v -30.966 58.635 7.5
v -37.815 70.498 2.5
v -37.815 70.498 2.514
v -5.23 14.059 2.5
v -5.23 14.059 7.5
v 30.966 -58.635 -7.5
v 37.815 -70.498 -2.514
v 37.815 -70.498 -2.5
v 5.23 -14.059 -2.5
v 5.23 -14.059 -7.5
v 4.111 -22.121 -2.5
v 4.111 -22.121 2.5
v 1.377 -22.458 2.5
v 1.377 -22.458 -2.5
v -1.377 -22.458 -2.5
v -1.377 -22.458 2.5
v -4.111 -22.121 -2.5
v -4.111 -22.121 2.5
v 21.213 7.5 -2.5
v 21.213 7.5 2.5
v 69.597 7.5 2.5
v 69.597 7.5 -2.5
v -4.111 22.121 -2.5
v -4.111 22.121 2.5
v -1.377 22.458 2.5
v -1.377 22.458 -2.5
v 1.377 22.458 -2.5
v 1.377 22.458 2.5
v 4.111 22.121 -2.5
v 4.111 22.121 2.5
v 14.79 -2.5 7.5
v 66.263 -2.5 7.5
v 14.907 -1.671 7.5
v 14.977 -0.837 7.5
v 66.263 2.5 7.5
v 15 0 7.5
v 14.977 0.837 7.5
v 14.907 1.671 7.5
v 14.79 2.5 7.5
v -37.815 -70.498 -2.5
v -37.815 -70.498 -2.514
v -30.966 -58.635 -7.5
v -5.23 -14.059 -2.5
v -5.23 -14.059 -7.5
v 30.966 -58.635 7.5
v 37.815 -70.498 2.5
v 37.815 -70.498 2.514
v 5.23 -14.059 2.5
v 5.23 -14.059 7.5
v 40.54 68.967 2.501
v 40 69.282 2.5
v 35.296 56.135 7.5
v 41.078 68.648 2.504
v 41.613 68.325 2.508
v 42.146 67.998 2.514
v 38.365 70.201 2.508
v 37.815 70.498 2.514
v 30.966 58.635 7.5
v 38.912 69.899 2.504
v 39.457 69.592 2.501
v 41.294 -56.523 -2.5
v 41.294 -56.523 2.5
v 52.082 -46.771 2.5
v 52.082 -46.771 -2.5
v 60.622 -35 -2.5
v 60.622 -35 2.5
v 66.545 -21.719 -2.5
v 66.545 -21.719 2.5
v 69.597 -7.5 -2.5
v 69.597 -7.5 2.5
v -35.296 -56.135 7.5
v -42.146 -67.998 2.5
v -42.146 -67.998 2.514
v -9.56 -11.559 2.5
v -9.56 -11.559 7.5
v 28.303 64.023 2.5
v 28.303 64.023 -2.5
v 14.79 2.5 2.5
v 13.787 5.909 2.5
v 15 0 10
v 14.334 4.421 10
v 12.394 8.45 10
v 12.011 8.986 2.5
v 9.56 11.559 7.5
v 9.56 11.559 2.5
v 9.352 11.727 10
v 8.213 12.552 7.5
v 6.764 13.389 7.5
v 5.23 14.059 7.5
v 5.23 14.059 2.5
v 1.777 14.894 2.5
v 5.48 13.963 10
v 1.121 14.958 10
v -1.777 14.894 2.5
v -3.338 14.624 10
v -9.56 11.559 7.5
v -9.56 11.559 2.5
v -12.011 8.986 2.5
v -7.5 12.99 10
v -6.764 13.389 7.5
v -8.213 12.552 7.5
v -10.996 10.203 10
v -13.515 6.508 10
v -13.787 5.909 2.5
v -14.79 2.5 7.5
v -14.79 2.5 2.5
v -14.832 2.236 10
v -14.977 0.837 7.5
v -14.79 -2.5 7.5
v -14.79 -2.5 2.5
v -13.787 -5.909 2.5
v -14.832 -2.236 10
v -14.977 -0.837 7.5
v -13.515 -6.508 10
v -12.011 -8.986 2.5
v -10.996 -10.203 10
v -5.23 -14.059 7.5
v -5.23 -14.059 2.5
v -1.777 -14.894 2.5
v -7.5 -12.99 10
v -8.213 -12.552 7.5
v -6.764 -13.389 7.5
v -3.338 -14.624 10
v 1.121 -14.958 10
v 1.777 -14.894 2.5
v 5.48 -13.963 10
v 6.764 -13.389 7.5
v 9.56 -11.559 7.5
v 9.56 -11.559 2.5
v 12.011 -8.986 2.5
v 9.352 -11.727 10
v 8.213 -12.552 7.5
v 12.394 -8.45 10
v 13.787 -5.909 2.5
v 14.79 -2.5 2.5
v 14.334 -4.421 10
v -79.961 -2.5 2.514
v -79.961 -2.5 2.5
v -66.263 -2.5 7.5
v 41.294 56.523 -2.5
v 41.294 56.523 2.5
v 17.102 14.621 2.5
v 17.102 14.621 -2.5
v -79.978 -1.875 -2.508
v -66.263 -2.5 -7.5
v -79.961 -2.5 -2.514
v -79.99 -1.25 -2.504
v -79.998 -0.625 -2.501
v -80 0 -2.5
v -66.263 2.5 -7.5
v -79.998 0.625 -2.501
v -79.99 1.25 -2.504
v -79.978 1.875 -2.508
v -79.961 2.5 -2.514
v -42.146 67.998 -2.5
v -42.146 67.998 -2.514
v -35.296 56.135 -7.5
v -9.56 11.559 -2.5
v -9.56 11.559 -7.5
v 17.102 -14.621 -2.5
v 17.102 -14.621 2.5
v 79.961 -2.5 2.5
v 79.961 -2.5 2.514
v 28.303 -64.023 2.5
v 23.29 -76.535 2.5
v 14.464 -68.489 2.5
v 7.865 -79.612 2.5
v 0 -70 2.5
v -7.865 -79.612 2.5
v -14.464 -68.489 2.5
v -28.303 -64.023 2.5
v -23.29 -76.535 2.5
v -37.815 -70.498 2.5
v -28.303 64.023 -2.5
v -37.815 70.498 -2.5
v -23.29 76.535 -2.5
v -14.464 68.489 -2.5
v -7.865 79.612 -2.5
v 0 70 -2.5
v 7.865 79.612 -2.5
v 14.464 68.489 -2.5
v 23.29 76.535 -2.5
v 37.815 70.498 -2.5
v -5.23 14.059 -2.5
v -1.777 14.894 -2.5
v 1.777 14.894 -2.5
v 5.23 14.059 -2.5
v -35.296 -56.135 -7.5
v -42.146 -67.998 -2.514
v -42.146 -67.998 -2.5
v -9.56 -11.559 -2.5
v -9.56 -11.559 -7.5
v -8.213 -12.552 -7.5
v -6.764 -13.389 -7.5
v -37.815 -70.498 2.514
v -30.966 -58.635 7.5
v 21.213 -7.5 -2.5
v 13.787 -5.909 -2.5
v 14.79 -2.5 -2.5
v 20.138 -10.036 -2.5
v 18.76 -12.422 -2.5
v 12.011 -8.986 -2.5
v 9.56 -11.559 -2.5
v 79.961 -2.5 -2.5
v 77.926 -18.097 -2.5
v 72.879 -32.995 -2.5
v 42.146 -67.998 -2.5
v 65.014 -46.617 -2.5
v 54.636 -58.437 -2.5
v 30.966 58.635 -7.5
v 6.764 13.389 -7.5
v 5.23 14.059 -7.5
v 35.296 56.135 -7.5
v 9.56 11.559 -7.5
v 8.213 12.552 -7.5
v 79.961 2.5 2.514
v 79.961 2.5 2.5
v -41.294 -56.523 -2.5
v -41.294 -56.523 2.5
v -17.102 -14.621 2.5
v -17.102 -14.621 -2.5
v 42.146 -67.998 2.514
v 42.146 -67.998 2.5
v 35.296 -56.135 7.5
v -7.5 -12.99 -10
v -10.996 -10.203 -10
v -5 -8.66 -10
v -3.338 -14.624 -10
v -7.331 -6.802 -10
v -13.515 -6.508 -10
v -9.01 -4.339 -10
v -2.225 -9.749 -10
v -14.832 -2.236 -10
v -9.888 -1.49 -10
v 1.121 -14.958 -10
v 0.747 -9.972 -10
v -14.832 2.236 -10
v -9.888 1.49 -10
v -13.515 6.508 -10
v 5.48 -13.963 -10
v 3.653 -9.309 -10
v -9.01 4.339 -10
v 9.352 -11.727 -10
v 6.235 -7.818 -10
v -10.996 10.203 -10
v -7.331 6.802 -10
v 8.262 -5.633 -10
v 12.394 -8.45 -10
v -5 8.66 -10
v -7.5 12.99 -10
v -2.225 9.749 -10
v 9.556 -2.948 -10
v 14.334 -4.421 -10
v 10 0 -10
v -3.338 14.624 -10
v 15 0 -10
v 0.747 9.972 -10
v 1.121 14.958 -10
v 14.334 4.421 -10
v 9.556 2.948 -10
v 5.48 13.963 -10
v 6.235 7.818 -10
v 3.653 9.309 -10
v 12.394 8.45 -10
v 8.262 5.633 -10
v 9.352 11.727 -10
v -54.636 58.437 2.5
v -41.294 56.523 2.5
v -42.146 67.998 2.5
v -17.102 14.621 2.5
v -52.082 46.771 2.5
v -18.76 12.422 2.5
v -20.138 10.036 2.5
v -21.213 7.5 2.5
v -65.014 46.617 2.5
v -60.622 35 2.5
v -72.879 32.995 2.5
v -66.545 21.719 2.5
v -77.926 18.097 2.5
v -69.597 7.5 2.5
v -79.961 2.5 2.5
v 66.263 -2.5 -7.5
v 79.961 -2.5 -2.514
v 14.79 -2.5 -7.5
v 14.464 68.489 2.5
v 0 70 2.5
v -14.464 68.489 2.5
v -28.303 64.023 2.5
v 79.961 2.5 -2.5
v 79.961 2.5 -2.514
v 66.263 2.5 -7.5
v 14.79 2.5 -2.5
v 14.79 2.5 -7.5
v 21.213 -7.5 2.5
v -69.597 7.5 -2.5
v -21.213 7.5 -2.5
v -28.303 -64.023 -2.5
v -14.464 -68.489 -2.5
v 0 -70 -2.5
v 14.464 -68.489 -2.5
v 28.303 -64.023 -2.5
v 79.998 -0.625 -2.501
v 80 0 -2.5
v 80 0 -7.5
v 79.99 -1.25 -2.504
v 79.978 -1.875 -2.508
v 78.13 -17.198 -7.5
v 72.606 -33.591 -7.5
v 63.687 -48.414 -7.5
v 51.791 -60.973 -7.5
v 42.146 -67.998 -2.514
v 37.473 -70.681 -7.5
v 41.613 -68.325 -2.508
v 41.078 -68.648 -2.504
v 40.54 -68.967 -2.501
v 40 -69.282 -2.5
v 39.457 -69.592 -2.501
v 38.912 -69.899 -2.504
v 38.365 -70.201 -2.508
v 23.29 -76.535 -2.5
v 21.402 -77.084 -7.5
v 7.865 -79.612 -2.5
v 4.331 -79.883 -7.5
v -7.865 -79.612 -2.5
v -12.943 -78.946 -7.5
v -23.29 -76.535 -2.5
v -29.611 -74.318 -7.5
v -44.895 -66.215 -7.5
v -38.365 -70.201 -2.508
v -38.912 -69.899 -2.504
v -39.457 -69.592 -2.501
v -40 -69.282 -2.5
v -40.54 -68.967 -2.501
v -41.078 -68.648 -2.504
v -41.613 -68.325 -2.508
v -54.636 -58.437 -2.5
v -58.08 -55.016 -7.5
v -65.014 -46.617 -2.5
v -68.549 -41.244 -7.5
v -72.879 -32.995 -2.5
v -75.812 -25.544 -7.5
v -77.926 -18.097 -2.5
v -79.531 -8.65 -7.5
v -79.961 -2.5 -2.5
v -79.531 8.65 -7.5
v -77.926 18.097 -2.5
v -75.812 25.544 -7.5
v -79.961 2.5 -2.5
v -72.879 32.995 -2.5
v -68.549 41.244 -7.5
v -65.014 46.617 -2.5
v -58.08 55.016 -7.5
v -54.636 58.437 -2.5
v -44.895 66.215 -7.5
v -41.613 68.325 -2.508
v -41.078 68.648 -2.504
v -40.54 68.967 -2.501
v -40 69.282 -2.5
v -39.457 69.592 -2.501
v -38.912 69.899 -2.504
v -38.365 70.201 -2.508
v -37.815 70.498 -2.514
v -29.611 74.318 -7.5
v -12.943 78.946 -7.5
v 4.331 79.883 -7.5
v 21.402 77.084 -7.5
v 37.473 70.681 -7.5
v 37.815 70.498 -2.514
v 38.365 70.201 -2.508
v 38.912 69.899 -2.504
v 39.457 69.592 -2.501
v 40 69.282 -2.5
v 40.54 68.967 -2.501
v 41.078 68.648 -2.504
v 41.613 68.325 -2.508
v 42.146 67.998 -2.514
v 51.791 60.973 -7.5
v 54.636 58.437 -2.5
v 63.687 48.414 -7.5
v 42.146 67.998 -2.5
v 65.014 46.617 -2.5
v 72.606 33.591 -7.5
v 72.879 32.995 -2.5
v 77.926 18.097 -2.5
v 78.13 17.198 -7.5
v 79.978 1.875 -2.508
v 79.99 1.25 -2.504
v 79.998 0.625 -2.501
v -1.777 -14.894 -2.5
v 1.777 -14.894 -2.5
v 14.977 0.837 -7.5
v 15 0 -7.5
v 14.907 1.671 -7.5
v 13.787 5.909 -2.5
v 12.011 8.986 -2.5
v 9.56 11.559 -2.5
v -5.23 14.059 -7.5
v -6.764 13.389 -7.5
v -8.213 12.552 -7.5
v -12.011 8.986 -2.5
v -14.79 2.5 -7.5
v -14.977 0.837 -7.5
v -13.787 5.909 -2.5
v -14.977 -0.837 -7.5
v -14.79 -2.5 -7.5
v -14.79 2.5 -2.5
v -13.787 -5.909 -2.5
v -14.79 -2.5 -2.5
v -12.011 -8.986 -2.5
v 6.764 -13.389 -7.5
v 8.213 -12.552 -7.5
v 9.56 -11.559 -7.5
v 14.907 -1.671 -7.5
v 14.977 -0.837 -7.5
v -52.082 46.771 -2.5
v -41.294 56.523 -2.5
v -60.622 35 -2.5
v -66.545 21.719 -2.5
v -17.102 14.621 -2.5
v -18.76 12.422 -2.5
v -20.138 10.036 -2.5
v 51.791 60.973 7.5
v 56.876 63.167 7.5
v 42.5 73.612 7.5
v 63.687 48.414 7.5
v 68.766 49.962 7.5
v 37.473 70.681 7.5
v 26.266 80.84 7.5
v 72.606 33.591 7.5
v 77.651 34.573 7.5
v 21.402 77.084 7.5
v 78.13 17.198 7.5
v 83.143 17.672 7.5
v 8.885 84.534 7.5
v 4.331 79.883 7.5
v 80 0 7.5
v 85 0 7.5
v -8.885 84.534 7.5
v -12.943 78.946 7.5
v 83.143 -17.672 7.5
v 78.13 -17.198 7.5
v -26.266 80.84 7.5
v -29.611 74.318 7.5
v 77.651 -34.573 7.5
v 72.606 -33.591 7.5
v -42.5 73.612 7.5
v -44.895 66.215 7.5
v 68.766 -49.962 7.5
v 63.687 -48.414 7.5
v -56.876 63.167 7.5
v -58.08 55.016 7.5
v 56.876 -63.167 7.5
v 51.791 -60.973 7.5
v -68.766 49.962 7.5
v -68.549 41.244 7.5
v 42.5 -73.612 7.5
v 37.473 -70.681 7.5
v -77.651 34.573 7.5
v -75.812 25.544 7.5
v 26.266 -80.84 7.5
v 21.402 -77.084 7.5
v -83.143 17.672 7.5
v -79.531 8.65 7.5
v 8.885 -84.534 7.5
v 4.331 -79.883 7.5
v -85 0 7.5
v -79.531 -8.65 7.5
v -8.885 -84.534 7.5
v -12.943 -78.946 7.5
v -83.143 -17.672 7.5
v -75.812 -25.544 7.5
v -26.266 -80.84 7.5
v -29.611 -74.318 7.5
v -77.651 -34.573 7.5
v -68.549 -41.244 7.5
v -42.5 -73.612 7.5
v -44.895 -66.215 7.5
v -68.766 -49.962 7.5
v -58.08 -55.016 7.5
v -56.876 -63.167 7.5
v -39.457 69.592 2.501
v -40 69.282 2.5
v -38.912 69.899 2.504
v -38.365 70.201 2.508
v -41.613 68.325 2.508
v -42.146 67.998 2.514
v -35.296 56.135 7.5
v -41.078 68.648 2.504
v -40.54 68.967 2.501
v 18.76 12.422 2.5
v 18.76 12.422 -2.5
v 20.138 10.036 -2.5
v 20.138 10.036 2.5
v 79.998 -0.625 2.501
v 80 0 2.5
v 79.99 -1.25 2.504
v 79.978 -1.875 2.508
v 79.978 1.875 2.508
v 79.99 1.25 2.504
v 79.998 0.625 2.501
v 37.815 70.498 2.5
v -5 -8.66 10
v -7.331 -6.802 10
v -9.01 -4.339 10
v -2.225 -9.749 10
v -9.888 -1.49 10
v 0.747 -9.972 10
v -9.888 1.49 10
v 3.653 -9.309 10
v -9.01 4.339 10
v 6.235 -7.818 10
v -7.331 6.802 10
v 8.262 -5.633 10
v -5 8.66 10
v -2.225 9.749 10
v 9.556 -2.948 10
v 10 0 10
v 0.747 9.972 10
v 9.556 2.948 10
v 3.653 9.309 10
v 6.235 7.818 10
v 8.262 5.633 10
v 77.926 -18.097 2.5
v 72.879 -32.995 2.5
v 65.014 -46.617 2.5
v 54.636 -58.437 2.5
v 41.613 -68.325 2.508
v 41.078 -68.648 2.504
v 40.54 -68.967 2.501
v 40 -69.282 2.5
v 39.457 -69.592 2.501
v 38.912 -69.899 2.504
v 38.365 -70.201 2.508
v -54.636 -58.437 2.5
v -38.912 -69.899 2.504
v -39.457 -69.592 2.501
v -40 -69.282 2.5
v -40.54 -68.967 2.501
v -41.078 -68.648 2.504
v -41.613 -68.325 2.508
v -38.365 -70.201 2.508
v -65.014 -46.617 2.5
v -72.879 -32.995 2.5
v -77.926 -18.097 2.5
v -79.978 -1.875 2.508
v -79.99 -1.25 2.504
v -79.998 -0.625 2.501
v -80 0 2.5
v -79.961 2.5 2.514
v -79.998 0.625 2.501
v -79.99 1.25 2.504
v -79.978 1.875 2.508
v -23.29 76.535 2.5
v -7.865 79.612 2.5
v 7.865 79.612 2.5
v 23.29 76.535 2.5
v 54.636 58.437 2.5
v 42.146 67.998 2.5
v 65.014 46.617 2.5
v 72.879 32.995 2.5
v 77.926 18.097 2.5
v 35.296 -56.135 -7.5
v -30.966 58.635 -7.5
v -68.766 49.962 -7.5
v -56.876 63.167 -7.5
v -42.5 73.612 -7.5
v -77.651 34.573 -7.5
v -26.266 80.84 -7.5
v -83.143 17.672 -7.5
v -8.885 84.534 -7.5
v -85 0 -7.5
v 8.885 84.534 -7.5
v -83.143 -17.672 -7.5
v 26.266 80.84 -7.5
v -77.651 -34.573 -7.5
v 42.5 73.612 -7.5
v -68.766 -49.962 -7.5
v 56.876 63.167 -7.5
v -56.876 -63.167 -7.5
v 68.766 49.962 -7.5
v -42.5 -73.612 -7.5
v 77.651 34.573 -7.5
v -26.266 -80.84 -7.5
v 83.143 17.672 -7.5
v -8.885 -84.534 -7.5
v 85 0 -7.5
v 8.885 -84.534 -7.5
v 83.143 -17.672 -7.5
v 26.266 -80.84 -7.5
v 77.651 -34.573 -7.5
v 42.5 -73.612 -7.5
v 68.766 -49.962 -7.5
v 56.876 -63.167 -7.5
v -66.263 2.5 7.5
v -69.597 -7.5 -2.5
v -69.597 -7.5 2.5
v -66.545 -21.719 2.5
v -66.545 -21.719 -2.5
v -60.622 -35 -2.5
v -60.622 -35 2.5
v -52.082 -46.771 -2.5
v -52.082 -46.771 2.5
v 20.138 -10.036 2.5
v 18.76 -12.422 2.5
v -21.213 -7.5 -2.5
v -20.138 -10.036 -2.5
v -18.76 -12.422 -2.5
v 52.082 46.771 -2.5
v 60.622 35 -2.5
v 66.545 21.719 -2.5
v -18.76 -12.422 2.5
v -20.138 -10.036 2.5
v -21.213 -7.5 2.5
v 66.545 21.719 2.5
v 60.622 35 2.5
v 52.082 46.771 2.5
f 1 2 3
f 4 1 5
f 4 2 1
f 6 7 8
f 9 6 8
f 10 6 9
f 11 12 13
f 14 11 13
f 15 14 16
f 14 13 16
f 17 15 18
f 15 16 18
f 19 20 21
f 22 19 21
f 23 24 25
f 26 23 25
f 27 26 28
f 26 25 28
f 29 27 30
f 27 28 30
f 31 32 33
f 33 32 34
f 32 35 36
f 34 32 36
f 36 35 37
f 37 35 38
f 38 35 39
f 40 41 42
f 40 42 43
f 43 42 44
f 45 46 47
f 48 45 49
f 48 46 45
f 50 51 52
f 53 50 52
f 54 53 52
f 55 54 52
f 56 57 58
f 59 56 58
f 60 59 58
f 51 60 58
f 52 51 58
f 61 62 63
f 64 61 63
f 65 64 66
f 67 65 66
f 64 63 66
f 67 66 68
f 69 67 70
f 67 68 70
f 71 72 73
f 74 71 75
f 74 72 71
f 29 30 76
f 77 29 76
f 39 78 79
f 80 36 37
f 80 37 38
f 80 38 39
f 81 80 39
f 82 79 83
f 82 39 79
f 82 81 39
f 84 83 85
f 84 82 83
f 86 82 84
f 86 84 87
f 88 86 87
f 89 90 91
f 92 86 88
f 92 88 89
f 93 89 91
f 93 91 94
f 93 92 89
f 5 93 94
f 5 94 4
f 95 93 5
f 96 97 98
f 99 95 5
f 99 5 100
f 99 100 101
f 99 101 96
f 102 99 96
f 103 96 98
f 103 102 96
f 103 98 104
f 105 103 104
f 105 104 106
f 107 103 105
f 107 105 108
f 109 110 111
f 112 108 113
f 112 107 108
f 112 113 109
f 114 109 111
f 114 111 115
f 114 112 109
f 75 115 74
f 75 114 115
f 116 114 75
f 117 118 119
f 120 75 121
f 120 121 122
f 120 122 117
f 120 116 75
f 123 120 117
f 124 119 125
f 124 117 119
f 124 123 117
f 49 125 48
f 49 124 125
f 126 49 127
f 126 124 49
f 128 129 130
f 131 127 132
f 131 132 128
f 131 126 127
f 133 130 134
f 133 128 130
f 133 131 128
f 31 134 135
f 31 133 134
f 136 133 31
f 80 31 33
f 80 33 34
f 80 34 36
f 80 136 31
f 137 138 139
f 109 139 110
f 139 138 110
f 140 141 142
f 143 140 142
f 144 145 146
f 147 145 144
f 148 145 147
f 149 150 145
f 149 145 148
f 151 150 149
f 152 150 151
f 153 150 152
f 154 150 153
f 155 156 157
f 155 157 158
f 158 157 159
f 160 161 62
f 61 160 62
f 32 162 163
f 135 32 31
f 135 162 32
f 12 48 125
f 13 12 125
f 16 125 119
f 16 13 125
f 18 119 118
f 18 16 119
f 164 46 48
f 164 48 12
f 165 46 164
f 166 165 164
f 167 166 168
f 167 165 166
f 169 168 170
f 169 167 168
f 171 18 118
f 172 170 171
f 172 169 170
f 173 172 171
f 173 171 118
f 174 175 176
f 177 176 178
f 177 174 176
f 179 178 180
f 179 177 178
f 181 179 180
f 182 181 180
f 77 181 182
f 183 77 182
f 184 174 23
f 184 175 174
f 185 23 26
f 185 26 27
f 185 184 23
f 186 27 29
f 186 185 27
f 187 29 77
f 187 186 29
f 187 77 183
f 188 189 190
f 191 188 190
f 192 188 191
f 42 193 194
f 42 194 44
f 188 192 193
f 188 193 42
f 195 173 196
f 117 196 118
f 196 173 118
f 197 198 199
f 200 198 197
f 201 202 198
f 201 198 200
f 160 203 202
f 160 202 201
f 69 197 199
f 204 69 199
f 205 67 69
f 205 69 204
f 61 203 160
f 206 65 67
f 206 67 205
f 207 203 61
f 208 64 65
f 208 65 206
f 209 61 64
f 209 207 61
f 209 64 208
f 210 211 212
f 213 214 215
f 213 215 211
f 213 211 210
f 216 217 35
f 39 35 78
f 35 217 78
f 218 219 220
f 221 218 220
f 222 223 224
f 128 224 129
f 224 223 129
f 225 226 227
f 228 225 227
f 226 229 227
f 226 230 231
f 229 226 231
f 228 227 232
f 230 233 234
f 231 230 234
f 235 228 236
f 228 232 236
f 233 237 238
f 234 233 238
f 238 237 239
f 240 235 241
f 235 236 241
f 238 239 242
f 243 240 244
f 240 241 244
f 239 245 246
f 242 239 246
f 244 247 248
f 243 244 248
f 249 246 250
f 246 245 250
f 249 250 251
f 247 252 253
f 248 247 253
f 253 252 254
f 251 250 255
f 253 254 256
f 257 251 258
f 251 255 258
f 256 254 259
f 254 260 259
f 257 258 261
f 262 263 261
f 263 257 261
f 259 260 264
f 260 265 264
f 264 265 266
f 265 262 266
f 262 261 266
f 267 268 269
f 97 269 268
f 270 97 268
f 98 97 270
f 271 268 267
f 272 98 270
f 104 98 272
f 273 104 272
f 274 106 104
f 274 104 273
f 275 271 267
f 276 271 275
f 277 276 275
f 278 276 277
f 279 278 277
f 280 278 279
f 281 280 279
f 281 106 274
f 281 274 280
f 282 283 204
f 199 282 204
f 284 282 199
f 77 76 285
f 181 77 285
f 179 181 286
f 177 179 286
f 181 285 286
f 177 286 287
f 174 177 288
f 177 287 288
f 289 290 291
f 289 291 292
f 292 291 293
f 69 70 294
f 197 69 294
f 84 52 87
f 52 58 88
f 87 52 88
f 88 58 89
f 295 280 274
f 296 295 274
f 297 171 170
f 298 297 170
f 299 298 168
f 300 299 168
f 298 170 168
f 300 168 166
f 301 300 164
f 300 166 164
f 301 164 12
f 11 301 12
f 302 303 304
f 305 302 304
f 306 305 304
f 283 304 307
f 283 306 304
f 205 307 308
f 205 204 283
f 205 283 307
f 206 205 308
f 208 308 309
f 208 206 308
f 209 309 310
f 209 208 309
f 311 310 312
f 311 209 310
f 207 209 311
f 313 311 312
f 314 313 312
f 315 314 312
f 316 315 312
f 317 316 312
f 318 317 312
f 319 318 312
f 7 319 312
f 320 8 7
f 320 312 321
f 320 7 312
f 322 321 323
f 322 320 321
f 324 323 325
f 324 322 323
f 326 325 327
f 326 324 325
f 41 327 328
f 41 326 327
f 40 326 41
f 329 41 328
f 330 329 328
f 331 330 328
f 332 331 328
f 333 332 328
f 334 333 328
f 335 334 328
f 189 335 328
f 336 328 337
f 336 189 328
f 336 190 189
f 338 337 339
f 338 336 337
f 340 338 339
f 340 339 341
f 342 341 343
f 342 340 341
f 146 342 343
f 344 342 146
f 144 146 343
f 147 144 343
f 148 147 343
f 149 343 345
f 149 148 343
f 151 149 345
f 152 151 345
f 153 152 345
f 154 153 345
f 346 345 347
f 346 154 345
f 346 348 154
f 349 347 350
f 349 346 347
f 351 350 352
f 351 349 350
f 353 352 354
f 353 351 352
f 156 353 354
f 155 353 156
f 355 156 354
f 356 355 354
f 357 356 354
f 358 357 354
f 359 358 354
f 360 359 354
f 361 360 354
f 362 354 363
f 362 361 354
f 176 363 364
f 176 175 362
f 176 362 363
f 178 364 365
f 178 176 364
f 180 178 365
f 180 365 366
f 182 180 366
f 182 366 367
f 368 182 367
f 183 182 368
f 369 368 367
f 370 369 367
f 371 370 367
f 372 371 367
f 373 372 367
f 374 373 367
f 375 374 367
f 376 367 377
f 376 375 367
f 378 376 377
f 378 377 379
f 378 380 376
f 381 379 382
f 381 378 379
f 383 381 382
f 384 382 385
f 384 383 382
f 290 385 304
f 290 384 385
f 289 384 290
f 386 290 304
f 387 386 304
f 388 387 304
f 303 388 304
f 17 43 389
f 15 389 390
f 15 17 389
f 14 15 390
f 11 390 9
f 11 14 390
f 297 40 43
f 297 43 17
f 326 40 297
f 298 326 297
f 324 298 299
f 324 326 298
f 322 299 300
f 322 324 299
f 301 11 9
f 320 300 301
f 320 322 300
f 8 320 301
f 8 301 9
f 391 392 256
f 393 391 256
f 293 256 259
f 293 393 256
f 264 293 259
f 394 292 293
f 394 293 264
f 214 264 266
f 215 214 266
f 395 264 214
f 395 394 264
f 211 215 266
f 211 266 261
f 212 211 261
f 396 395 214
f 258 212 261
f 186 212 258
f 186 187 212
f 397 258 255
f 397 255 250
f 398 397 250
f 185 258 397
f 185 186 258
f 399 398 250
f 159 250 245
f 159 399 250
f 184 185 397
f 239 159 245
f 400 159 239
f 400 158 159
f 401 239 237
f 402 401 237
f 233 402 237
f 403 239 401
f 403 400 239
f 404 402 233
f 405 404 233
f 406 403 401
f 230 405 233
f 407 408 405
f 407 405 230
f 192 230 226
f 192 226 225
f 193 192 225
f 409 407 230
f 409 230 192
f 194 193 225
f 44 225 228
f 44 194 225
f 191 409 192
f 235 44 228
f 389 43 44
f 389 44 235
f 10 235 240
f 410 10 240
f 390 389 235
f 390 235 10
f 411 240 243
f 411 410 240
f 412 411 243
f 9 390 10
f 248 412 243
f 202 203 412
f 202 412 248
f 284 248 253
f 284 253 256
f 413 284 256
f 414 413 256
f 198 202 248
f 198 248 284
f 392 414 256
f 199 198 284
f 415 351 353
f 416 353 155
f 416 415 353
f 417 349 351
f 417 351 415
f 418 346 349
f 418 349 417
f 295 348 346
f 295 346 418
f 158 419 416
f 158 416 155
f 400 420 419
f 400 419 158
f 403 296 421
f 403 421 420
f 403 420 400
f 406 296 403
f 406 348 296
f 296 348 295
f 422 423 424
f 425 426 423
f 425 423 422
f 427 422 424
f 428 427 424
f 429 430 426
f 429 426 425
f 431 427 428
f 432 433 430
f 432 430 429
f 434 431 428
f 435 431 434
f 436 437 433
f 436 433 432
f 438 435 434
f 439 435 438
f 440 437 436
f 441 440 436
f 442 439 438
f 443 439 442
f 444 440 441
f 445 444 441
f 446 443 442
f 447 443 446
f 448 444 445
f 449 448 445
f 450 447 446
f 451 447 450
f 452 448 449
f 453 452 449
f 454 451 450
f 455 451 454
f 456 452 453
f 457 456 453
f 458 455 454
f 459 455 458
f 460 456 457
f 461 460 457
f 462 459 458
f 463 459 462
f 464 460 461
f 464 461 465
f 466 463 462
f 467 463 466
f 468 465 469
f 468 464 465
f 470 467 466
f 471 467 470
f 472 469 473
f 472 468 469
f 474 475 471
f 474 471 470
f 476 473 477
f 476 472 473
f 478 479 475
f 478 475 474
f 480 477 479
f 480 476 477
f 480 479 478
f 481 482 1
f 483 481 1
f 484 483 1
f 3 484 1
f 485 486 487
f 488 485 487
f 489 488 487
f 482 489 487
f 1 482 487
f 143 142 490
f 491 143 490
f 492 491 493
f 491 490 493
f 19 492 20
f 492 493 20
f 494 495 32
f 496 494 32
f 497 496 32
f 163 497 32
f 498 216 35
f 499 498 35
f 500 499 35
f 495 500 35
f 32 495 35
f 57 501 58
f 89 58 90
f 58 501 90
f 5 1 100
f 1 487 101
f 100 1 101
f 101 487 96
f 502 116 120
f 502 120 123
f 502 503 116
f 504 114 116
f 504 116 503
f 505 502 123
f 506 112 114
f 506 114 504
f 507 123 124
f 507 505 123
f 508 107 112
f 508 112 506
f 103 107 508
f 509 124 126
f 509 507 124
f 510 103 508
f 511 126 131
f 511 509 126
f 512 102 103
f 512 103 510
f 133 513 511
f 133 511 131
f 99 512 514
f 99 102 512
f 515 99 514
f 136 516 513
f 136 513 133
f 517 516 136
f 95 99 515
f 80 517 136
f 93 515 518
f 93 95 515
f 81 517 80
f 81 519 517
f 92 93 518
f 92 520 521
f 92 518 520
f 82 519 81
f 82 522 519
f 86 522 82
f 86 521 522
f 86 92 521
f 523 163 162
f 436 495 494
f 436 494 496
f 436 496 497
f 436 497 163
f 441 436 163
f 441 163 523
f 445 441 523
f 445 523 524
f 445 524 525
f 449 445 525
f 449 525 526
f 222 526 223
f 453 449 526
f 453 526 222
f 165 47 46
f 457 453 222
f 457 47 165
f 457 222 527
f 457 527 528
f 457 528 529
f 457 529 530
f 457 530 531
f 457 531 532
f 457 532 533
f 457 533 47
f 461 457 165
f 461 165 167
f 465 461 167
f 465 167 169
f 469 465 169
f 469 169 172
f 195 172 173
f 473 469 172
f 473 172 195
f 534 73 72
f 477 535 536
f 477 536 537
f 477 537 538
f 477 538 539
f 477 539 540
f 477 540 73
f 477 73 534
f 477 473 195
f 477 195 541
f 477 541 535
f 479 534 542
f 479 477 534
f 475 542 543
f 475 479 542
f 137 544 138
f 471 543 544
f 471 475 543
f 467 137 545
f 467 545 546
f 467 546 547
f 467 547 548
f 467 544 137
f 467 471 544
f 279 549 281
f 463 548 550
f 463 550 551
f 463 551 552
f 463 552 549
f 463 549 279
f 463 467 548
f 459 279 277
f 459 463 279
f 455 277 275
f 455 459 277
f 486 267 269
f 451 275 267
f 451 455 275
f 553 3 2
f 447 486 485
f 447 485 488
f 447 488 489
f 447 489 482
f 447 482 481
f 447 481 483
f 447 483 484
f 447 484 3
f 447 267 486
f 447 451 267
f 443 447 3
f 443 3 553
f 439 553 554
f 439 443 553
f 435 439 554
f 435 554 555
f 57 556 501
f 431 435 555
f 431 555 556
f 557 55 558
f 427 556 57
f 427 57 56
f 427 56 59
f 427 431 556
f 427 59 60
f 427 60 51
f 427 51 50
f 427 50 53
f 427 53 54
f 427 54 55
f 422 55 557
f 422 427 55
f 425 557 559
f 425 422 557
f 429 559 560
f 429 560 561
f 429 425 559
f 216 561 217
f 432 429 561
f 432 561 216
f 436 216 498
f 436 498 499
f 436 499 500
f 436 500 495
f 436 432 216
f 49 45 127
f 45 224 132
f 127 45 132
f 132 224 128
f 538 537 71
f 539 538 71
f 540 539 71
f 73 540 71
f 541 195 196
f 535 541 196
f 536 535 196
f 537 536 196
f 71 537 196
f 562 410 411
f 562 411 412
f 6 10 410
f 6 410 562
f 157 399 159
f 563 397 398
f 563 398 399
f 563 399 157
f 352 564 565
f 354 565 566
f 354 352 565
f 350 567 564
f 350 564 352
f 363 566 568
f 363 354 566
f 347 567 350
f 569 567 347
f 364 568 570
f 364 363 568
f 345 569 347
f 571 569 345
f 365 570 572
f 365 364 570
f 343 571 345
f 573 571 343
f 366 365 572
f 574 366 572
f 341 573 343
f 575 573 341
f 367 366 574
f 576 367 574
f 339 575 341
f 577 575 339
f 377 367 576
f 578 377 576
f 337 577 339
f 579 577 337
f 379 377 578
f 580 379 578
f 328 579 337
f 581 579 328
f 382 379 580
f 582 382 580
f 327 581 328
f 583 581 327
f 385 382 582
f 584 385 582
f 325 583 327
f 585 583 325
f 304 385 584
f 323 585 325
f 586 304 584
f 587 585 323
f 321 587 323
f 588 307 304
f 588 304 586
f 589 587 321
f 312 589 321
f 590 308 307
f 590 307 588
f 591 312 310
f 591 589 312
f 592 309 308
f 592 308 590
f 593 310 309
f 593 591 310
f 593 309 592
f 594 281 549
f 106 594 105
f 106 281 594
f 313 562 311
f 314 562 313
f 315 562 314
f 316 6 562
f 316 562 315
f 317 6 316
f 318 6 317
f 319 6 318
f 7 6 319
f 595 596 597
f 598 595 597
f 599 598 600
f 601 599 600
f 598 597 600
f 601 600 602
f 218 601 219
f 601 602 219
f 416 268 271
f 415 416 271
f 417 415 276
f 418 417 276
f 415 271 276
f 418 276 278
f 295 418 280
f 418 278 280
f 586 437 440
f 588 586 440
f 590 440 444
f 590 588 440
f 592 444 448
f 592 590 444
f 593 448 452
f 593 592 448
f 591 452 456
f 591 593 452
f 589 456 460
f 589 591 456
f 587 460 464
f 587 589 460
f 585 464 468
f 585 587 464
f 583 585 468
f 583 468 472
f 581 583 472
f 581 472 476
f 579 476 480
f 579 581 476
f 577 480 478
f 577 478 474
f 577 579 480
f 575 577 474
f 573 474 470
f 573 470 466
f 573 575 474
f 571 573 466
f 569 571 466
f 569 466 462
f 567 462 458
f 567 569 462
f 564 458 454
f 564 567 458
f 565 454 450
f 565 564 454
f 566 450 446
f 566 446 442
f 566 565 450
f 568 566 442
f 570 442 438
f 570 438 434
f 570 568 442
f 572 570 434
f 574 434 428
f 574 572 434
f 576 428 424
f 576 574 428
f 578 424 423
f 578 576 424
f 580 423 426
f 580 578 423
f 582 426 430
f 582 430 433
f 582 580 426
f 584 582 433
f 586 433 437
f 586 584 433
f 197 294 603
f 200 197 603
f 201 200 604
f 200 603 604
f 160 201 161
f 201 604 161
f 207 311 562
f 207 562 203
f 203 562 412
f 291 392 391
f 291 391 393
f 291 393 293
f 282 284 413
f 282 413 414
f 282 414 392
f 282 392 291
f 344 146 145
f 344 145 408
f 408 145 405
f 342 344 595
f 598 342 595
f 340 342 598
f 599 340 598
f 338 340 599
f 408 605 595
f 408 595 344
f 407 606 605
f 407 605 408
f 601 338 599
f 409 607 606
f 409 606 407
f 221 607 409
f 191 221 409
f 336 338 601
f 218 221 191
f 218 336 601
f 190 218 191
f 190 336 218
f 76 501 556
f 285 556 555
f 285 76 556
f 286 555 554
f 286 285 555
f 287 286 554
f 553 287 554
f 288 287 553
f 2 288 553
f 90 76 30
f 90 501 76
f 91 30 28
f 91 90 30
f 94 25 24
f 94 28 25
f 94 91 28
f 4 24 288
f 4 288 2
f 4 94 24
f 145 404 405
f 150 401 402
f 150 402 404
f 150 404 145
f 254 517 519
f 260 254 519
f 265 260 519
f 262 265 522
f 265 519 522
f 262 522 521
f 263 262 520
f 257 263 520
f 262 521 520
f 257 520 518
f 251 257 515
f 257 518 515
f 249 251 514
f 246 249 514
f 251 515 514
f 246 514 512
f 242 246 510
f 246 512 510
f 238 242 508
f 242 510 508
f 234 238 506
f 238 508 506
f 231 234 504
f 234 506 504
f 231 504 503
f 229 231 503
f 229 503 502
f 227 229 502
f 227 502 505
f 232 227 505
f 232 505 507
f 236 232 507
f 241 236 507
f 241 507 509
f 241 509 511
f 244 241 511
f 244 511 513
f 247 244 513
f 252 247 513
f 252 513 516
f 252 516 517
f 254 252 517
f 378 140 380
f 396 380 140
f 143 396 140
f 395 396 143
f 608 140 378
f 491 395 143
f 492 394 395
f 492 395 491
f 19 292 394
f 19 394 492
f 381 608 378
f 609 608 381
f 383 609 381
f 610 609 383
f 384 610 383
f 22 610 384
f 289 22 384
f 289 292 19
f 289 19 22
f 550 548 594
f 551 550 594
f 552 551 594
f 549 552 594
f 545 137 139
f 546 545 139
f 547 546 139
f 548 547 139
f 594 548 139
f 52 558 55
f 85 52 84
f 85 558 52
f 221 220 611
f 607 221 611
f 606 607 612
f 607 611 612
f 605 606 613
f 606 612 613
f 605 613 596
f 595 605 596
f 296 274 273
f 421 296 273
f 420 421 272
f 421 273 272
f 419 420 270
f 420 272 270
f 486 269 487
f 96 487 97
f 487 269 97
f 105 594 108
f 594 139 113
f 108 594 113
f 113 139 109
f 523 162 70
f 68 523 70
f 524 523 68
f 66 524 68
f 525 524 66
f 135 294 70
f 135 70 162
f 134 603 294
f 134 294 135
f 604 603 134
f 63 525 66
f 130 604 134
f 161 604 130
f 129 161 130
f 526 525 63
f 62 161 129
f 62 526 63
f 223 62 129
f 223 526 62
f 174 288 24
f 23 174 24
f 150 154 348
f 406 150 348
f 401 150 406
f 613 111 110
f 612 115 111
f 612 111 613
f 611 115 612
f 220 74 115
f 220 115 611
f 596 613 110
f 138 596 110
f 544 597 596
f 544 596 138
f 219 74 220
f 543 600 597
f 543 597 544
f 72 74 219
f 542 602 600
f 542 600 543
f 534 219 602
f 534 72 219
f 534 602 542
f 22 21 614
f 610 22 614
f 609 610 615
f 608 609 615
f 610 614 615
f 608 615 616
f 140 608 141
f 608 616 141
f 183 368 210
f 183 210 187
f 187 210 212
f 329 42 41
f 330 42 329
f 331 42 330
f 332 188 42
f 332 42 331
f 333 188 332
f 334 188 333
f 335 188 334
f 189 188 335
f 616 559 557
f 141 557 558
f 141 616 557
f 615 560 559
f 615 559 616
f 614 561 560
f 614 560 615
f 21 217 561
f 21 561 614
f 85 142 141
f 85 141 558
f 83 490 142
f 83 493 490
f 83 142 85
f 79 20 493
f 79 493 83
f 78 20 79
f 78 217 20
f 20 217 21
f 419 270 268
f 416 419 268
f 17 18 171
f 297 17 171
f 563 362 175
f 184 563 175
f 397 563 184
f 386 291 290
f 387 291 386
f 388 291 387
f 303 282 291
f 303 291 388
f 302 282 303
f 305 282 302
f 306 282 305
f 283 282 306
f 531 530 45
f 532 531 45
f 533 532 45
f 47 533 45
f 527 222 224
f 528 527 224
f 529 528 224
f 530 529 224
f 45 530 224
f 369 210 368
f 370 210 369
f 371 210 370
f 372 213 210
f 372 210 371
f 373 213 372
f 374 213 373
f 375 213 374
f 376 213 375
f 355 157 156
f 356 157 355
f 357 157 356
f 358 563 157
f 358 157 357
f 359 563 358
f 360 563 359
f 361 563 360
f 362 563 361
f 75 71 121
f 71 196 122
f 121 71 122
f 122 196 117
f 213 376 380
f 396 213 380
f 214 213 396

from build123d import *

# Parameters (mm, degrees)
SKETCH1_R           = 15
BOSS_EXTRUDE1_DEPTH = 10
BOSS_EXTRUDE9_DEPTH = 2.5
CIRPATTERN1_COUNT   = 6
CUT_EXTRUDE2_DEPTH  = 5
CIRPATTERN2_COUNT   = 6
SKETCH3_R           = 10
CUT_EXTRUDE3_DEPTH  = 25


with BuildPart() as part:
    # Sketch1 → Boss-Extrude1 (new, symmetric)
    with BuildSketch(Plane.XY):
        Circle(SKETCH1_R)
    extrude(amount=BOSS_EXTRUDE1_DEPTH, both=True)

    # Sketch2 → Revolve1 (revolve)
    with BuildSketch(Plane(origin=(0, 0, 0), x_dir=(0, 0, -1), z_dir=(1, 0, 0)), mode=Mode.PRIVATE) as revolve1_sk:
        Polygon((-2.5, 15), (-2.5, 80), (-7.5, 80), (-7.5, 85), (7.5, 85), (7.5, 80), (2.5, 80), (2.5, 15), align=None)
    revolve(revolve1_sk.sketch.rotate(Axis((0, 0, 0), (0, 0, -1)), 90), axis=Axis((0, 0, 0), (0, 0, -1)))

    # Sketch5 → Boss-Extrude9 (add, symmetric)
    with BuildSketch(Plane(origin=(0, 0, 0), x_dir=(1, 0, 0), z_dir=(0, 1, 0))):
        Polygon((0, -2.5), (-80, -2.5), (-66.262612903, -7.5), (0, -7.5), align=None)
        Polygon((0, 7.5), (-66.262612903, 7.5), (-80, 2.5), (0, 2.5), align=None)
    boss_extrude9 = extrude(amount=BOSS_EXTRUDE9_DEPTH, both=True)

    # CirPattern1: Boss-Extrude9 ×6 about axis
    cirpattern1_axis = Axis((0, 0, 0), (0, 0, 1))
    for i in range(1, CIRPATTERN1_COUNT):
        add(boss_extrude9.rotate(cirpattern1_axis, i * 360 / CIRPATTERN1_COUNT))

    # Sketch6 → Cut-Extrude2 (cut)
    with BuildSketch(Plane.XY.offset(2.5)):
        with BuildLine():
            Line((-17.101792246, 14.621173071), (-41.293717796, 56.522817256))
            ThreePointArc((-41.293717796, 56.522817256), (-60.621778265, 35), (-69.597054535, 7.5))
            Line((-69.597054535, 7.5), (-21.213203436, 7.5))
            ThreePointArc((-21.213203436, 7.5), (-19.485571585, 11.25), (-17.101792246, 14.621173071))
        make_face()
    cut_extrude2 = extrude(amount=-CUT_EXTRUDE2_DEPTH, mode=Mode.SUBTRACT)

    # CirPattern2: Cut-Extrude2 ×6 about axis
    cirpattern2_axis = Axis((0, 0, 0), (0, 0, 1))
    for i in range(1, CIRPATTERN2_COUNT):
        add(cut_extrude2.rotate(cirpattern2_axis, i * 360 / CIRPATTERN2_COUNT), mode=Mode.SUBTRACT)

    # Sketch3 → Cut-Extrude3 (cut)
    with BuildSketch(Plane.XY.offset(10)):
        Circle(SKETCH3_R)
    extrude(amount=-CUT_EXTRUDE3_DEPTH, mode=Mode.SUBTRACT)


solid = part.part
